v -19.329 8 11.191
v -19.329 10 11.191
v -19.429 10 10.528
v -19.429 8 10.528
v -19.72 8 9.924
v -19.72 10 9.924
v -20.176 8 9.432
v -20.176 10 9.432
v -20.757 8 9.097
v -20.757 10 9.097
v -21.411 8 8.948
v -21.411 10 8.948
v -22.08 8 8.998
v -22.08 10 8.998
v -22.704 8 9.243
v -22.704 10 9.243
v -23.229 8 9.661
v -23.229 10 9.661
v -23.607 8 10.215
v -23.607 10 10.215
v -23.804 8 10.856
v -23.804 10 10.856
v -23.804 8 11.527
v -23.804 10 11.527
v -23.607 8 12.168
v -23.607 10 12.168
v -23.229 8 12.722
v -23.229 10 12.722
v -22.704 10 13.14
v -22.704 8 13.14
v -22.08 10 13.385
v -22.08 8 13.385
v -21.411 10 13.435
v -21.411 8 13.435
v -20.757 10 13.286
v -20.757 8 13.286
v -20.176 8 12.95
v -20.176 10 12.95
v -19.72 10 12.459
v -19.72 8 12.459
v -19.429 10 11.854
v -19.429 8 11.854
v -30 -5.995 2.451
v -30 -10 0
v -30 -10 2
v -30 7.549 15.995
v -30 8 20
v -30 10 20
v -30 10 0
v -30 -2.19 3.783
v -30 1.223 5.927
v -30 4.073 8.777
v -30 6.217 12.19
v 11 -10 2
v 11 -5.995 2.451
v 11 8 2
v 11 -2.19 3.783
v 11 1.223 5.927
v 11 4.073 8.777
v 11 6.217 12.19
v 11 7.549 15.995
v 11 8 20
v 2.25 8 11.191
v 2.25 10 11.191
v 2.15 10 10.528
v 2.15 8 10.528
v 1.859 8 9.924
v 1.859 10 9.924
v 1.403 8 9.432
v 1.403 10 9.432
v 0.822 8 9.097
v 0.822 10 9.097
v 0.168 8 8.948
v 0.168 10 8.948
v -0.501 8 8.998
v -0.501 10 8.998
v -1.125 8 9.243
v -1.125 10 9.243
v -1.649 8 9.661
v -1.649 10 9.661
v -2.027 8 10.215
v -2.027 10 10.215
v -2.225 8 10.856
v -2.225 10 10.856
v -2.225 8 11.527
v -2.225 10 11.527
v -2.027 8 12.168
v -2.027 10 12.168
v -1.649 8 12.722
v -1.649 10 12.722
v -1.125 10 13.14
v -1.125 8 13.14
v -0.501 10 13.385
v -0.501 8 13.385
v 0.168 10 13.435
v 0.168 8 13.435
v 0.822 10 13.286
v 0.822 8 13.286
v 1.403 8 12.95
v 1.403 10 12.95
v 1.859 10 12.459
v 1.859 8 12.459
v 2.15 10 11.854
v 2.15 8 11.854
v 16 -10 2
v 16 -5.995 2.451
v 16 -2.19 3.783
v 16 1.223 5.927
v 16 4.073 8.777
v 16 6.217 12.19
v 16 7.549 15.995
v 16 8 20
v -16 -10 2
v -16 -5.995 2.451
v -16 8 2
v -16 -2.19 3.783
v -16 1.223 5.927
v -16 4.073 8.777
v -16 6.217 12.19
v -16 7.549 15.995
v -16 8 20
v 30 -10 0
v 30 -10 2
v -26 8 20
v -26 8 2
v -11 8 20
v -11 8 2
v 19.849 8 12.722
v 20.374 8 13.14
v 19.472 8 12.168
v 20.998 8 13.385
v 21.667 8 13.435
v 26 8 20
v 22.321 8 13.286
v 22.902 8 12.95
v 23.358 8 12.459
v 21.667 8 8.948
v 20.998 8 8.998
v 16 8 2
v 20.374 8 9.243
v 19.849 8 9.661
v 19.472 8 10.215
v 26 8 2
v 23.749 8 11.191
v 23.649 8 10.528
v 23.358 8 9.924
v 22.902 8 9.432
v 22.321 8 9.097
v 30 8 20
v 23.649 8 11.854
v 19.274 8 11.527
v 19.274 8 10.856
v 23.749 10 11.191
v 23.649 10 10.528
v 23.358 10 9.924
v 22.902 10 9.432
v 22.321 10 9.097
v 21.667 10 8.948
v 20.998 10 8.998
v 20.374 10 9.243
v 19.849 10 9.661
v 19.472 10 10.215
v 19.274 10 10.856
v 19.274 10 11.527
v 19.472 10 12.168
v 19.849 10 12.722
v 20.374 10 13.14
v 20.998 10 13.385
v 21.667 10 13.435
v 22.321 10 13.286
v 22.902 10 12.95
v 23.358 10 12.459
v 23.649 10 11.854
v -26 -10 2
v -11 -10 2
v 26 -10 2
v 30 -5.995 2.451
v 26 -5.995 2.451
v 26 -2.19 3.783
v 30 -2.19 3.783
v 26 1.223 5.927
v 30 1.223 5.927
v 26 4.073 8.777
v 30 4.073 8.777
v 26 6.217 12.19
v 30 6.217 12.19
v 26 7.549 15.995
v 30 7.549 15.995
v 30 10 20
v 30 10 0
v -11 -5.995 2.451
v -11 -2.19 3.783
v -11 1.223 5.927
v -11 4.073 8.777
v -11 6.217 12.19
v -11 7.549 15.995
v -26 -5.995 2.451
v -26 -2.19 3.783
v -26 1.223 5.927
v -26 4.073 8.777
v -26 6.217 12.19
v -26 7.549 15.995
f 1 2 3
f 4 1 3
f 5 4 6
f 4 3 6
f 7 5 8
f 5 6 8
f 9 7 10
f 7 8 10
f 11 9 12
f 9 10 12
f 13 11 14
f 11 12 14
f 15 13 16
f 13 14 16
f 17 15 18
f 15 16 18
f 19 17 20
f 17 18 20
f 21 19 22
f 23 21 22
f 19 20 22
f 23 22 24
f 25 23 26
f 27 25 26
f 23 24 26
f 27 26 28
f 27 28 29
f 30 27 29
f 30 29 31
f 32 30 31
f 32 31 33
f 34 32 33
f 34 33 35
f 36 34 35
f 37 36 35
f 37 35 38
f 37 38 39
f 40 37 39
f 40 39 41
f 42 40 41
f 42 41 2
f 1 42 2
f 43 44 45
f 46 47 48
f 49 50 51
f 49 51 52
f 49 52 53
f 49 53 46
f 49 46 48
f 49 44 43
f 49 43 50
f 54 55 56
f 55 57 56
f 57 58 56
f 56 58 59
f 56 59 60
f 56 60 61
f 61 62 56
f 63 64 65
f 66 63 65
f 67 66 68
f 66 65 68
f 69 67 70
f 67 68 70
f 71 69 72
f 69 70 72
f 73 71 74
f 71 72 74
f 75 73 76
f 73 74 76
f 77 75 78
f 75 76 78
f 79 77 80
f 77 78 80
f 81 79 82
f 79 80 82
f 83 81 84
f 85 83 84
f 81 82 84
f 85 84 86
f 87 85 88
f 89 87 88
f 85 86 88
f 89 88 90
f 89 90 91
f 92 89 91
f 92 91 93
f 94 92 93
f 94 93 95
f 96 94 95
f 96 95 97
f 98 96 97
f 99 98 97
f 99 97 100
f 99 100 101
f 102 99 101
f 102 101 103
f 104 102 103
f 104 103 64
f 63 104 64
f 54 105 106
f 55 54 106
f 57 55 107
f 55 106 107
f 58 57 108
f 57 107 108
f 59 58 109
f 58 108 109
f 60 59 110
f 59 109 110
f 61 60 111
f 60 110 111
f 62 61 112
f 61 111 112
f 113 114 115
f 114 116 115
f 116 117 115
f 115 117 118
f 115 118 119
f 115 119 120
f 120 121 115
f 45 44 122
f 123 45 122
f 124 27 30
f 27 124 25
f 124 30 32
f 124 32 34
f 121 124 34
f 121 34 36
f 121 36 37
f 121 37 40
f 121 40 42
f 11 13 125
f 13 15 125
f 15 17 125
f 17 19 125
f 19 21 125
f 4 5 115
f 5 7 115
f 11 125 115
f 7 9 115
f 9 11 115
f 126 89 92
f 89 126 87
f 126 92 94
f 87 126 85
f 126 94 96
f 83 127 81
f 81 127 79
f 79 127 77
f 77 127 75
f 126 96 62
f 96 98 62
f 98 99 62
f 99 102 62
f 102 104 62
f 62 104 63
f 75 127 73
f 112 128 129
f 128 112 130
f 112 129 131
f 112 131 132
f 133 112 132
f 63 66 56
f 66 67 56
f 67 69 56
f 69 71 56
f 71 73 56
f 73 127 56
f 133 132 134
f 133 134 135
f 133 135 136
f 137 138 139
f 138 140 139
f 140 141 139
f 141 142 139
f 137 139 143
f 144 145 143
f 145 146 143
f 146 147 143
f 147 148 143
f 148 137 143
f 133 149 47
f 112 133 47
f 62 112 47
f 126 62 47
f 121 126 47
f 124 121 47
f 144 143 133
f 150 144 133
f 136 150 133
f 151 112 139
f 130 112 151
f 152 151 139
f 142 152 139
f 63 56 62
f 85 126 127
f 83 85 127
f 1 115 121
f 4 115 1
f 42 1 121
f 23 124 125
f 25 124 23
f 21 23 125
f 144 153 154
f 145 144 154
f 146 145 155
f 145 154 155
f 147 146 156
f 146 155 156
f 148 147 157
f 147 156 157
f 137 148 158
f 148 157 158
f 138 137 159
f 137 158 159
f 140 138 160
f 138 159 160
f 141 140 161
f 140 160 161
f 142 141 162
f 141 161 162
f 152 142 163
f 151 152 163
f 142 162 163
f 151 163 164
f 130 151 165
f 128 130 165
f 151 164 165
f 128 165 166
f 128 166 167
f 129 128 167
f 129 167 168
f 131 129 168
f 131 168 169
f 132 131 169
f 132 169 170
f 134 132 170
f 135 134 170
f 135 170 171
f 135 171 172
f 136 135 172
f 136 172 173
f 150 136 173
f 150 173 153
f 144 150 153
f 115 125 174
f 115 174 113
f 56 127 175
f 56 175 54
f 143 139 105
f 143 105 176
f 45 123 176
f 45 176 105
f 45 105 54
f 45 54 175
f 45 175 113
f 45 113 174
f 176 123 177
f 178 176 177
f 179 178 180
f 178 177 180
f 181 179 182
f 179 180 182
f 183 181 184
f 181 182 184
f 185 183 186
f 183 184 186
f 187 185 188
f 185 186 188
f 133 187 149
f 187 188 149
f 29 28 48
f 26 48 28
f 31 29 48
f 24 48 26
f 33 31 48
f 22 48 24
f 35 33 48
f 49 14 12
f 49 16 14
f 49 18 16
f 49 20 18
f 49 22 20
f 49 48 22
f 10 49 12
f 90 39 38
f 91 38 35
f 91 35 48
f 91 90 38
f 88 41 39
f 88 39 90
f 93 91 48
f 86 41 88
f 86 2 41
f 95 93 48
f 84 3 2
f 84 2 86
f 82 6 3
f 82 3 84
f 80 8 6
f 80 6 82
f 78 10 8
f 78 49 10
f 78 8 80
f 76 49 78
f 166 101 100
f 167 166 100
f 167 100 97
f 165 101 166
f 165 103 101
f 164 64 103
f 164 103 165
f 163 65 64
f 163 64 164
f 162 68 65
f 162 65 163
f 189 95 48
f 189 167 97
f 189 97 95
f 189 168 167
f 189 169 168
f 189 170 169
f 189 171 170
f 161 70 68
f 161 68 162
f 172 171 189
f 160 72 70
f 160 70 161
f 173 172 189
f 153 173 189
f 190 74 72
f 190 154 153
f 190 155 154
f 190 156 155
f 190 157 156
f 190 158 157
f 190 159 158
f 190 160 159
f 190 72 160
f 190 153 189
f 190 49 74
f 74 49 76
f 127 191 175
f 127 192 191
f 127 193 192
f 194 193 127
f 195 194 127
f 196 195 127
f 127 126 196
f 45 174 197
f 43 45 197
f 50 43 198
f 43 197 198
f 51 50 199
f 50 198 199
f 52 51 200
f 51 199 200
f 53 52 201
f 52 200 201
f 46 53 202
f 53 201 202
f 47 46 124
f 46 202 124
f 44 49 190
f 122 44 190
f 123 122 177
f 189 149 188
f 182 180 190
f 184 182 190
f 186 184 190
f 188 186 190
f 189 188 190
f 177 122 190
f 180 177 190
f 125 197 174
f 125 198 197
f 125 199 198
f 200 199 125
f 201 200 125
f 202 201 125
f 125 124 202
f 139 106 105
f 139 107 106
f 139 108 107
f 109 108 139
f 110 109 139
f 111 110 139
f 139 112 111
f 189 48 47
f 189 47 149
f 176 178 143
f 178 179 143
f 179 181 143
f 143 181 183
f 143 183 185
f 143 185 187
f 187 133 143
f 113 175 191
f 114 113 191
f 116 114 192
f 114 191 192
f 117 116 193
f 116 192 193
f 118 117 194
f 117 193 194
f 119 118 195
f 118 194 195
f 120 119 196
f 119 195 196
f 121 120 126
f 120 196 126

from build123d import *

# Parameters (mm, degrees)
SKETCH_1_W          = 60
SKETCH_1_H          = 20
EXTRUDE_1_DEPTH     = 2
SKETCH_2_W          = 60
SKETCH_2_H          = 2
EXTRUDE_2_DEPTH     = 18
FILLET_1_R          = 18
SKETCH_4_W          = 10
SKETCH_4_H          = 18
SKETCH_4_W_2        = 22
CUT_EXTRUDE_1_DEPTH = 18
HOLE_WIZARD_M4_1_D  = 4.5


with BuildPart() as part:
    # 스케치1 → 보스-돌출1 (new body)
    with BuildSketch(Plane.XY):
        Rectangle(SKETCH_1_W, SKETCH_1_H)
    extrude(amount=EXTRUDE_1_DEPTH)

    # 스케치2 → 보스-돌출2 (add)
    with BuildSketch(Plane.XY.offset(2)):
        with Locations((0, 9)):
            Rectangle(SKETCH_2_W, SKETCH_2_H)
    extrude(amount=EXTRUDE_2_DEPTH)

    # 필렛1
    fillet_1_edges = [part.edges().sort_by_distance(p)[0] for p in [
        (0, 8, 2),
    ]]
    fillet(fillet_1_edges, radius=FILLET_1_R - 0.0001)  # a hair under: the kernel refuses the full size

    # 스케치4 → 컷-돌출1 (cut)
    with BuildSketch(Plane.XY.offset(20)):
        with Locations((-21, -1)):
            Rectangle(SKETCH_4_W, SKETCH_4_H)
        with Locations((0, -1)):
            Rectangle(SKETCH_4_W_2, SKETCH_4_H)
        with Locations((21, -1)):
            Rectangle(SKETCH_4_W, SKETCH_4_H)
    extrude(amount=-CUT_EXTRUDE_1_DEPTH, mode=Mode.SUBTRACT)

    # M4 여유 구멍1 (through all)
    with Locations(Plane(origin=(0, 8, 0), x_dir=(-1, 0, 0), z_dir=(0, -1, 0))):
        with Locations((-21.498688558, -11.191274161), (21.579331698, -11.191274161), (0, -11.191274161)):
            Hole(HOLE_WIZARD_M4_1_D / 2)


solid = part.part
